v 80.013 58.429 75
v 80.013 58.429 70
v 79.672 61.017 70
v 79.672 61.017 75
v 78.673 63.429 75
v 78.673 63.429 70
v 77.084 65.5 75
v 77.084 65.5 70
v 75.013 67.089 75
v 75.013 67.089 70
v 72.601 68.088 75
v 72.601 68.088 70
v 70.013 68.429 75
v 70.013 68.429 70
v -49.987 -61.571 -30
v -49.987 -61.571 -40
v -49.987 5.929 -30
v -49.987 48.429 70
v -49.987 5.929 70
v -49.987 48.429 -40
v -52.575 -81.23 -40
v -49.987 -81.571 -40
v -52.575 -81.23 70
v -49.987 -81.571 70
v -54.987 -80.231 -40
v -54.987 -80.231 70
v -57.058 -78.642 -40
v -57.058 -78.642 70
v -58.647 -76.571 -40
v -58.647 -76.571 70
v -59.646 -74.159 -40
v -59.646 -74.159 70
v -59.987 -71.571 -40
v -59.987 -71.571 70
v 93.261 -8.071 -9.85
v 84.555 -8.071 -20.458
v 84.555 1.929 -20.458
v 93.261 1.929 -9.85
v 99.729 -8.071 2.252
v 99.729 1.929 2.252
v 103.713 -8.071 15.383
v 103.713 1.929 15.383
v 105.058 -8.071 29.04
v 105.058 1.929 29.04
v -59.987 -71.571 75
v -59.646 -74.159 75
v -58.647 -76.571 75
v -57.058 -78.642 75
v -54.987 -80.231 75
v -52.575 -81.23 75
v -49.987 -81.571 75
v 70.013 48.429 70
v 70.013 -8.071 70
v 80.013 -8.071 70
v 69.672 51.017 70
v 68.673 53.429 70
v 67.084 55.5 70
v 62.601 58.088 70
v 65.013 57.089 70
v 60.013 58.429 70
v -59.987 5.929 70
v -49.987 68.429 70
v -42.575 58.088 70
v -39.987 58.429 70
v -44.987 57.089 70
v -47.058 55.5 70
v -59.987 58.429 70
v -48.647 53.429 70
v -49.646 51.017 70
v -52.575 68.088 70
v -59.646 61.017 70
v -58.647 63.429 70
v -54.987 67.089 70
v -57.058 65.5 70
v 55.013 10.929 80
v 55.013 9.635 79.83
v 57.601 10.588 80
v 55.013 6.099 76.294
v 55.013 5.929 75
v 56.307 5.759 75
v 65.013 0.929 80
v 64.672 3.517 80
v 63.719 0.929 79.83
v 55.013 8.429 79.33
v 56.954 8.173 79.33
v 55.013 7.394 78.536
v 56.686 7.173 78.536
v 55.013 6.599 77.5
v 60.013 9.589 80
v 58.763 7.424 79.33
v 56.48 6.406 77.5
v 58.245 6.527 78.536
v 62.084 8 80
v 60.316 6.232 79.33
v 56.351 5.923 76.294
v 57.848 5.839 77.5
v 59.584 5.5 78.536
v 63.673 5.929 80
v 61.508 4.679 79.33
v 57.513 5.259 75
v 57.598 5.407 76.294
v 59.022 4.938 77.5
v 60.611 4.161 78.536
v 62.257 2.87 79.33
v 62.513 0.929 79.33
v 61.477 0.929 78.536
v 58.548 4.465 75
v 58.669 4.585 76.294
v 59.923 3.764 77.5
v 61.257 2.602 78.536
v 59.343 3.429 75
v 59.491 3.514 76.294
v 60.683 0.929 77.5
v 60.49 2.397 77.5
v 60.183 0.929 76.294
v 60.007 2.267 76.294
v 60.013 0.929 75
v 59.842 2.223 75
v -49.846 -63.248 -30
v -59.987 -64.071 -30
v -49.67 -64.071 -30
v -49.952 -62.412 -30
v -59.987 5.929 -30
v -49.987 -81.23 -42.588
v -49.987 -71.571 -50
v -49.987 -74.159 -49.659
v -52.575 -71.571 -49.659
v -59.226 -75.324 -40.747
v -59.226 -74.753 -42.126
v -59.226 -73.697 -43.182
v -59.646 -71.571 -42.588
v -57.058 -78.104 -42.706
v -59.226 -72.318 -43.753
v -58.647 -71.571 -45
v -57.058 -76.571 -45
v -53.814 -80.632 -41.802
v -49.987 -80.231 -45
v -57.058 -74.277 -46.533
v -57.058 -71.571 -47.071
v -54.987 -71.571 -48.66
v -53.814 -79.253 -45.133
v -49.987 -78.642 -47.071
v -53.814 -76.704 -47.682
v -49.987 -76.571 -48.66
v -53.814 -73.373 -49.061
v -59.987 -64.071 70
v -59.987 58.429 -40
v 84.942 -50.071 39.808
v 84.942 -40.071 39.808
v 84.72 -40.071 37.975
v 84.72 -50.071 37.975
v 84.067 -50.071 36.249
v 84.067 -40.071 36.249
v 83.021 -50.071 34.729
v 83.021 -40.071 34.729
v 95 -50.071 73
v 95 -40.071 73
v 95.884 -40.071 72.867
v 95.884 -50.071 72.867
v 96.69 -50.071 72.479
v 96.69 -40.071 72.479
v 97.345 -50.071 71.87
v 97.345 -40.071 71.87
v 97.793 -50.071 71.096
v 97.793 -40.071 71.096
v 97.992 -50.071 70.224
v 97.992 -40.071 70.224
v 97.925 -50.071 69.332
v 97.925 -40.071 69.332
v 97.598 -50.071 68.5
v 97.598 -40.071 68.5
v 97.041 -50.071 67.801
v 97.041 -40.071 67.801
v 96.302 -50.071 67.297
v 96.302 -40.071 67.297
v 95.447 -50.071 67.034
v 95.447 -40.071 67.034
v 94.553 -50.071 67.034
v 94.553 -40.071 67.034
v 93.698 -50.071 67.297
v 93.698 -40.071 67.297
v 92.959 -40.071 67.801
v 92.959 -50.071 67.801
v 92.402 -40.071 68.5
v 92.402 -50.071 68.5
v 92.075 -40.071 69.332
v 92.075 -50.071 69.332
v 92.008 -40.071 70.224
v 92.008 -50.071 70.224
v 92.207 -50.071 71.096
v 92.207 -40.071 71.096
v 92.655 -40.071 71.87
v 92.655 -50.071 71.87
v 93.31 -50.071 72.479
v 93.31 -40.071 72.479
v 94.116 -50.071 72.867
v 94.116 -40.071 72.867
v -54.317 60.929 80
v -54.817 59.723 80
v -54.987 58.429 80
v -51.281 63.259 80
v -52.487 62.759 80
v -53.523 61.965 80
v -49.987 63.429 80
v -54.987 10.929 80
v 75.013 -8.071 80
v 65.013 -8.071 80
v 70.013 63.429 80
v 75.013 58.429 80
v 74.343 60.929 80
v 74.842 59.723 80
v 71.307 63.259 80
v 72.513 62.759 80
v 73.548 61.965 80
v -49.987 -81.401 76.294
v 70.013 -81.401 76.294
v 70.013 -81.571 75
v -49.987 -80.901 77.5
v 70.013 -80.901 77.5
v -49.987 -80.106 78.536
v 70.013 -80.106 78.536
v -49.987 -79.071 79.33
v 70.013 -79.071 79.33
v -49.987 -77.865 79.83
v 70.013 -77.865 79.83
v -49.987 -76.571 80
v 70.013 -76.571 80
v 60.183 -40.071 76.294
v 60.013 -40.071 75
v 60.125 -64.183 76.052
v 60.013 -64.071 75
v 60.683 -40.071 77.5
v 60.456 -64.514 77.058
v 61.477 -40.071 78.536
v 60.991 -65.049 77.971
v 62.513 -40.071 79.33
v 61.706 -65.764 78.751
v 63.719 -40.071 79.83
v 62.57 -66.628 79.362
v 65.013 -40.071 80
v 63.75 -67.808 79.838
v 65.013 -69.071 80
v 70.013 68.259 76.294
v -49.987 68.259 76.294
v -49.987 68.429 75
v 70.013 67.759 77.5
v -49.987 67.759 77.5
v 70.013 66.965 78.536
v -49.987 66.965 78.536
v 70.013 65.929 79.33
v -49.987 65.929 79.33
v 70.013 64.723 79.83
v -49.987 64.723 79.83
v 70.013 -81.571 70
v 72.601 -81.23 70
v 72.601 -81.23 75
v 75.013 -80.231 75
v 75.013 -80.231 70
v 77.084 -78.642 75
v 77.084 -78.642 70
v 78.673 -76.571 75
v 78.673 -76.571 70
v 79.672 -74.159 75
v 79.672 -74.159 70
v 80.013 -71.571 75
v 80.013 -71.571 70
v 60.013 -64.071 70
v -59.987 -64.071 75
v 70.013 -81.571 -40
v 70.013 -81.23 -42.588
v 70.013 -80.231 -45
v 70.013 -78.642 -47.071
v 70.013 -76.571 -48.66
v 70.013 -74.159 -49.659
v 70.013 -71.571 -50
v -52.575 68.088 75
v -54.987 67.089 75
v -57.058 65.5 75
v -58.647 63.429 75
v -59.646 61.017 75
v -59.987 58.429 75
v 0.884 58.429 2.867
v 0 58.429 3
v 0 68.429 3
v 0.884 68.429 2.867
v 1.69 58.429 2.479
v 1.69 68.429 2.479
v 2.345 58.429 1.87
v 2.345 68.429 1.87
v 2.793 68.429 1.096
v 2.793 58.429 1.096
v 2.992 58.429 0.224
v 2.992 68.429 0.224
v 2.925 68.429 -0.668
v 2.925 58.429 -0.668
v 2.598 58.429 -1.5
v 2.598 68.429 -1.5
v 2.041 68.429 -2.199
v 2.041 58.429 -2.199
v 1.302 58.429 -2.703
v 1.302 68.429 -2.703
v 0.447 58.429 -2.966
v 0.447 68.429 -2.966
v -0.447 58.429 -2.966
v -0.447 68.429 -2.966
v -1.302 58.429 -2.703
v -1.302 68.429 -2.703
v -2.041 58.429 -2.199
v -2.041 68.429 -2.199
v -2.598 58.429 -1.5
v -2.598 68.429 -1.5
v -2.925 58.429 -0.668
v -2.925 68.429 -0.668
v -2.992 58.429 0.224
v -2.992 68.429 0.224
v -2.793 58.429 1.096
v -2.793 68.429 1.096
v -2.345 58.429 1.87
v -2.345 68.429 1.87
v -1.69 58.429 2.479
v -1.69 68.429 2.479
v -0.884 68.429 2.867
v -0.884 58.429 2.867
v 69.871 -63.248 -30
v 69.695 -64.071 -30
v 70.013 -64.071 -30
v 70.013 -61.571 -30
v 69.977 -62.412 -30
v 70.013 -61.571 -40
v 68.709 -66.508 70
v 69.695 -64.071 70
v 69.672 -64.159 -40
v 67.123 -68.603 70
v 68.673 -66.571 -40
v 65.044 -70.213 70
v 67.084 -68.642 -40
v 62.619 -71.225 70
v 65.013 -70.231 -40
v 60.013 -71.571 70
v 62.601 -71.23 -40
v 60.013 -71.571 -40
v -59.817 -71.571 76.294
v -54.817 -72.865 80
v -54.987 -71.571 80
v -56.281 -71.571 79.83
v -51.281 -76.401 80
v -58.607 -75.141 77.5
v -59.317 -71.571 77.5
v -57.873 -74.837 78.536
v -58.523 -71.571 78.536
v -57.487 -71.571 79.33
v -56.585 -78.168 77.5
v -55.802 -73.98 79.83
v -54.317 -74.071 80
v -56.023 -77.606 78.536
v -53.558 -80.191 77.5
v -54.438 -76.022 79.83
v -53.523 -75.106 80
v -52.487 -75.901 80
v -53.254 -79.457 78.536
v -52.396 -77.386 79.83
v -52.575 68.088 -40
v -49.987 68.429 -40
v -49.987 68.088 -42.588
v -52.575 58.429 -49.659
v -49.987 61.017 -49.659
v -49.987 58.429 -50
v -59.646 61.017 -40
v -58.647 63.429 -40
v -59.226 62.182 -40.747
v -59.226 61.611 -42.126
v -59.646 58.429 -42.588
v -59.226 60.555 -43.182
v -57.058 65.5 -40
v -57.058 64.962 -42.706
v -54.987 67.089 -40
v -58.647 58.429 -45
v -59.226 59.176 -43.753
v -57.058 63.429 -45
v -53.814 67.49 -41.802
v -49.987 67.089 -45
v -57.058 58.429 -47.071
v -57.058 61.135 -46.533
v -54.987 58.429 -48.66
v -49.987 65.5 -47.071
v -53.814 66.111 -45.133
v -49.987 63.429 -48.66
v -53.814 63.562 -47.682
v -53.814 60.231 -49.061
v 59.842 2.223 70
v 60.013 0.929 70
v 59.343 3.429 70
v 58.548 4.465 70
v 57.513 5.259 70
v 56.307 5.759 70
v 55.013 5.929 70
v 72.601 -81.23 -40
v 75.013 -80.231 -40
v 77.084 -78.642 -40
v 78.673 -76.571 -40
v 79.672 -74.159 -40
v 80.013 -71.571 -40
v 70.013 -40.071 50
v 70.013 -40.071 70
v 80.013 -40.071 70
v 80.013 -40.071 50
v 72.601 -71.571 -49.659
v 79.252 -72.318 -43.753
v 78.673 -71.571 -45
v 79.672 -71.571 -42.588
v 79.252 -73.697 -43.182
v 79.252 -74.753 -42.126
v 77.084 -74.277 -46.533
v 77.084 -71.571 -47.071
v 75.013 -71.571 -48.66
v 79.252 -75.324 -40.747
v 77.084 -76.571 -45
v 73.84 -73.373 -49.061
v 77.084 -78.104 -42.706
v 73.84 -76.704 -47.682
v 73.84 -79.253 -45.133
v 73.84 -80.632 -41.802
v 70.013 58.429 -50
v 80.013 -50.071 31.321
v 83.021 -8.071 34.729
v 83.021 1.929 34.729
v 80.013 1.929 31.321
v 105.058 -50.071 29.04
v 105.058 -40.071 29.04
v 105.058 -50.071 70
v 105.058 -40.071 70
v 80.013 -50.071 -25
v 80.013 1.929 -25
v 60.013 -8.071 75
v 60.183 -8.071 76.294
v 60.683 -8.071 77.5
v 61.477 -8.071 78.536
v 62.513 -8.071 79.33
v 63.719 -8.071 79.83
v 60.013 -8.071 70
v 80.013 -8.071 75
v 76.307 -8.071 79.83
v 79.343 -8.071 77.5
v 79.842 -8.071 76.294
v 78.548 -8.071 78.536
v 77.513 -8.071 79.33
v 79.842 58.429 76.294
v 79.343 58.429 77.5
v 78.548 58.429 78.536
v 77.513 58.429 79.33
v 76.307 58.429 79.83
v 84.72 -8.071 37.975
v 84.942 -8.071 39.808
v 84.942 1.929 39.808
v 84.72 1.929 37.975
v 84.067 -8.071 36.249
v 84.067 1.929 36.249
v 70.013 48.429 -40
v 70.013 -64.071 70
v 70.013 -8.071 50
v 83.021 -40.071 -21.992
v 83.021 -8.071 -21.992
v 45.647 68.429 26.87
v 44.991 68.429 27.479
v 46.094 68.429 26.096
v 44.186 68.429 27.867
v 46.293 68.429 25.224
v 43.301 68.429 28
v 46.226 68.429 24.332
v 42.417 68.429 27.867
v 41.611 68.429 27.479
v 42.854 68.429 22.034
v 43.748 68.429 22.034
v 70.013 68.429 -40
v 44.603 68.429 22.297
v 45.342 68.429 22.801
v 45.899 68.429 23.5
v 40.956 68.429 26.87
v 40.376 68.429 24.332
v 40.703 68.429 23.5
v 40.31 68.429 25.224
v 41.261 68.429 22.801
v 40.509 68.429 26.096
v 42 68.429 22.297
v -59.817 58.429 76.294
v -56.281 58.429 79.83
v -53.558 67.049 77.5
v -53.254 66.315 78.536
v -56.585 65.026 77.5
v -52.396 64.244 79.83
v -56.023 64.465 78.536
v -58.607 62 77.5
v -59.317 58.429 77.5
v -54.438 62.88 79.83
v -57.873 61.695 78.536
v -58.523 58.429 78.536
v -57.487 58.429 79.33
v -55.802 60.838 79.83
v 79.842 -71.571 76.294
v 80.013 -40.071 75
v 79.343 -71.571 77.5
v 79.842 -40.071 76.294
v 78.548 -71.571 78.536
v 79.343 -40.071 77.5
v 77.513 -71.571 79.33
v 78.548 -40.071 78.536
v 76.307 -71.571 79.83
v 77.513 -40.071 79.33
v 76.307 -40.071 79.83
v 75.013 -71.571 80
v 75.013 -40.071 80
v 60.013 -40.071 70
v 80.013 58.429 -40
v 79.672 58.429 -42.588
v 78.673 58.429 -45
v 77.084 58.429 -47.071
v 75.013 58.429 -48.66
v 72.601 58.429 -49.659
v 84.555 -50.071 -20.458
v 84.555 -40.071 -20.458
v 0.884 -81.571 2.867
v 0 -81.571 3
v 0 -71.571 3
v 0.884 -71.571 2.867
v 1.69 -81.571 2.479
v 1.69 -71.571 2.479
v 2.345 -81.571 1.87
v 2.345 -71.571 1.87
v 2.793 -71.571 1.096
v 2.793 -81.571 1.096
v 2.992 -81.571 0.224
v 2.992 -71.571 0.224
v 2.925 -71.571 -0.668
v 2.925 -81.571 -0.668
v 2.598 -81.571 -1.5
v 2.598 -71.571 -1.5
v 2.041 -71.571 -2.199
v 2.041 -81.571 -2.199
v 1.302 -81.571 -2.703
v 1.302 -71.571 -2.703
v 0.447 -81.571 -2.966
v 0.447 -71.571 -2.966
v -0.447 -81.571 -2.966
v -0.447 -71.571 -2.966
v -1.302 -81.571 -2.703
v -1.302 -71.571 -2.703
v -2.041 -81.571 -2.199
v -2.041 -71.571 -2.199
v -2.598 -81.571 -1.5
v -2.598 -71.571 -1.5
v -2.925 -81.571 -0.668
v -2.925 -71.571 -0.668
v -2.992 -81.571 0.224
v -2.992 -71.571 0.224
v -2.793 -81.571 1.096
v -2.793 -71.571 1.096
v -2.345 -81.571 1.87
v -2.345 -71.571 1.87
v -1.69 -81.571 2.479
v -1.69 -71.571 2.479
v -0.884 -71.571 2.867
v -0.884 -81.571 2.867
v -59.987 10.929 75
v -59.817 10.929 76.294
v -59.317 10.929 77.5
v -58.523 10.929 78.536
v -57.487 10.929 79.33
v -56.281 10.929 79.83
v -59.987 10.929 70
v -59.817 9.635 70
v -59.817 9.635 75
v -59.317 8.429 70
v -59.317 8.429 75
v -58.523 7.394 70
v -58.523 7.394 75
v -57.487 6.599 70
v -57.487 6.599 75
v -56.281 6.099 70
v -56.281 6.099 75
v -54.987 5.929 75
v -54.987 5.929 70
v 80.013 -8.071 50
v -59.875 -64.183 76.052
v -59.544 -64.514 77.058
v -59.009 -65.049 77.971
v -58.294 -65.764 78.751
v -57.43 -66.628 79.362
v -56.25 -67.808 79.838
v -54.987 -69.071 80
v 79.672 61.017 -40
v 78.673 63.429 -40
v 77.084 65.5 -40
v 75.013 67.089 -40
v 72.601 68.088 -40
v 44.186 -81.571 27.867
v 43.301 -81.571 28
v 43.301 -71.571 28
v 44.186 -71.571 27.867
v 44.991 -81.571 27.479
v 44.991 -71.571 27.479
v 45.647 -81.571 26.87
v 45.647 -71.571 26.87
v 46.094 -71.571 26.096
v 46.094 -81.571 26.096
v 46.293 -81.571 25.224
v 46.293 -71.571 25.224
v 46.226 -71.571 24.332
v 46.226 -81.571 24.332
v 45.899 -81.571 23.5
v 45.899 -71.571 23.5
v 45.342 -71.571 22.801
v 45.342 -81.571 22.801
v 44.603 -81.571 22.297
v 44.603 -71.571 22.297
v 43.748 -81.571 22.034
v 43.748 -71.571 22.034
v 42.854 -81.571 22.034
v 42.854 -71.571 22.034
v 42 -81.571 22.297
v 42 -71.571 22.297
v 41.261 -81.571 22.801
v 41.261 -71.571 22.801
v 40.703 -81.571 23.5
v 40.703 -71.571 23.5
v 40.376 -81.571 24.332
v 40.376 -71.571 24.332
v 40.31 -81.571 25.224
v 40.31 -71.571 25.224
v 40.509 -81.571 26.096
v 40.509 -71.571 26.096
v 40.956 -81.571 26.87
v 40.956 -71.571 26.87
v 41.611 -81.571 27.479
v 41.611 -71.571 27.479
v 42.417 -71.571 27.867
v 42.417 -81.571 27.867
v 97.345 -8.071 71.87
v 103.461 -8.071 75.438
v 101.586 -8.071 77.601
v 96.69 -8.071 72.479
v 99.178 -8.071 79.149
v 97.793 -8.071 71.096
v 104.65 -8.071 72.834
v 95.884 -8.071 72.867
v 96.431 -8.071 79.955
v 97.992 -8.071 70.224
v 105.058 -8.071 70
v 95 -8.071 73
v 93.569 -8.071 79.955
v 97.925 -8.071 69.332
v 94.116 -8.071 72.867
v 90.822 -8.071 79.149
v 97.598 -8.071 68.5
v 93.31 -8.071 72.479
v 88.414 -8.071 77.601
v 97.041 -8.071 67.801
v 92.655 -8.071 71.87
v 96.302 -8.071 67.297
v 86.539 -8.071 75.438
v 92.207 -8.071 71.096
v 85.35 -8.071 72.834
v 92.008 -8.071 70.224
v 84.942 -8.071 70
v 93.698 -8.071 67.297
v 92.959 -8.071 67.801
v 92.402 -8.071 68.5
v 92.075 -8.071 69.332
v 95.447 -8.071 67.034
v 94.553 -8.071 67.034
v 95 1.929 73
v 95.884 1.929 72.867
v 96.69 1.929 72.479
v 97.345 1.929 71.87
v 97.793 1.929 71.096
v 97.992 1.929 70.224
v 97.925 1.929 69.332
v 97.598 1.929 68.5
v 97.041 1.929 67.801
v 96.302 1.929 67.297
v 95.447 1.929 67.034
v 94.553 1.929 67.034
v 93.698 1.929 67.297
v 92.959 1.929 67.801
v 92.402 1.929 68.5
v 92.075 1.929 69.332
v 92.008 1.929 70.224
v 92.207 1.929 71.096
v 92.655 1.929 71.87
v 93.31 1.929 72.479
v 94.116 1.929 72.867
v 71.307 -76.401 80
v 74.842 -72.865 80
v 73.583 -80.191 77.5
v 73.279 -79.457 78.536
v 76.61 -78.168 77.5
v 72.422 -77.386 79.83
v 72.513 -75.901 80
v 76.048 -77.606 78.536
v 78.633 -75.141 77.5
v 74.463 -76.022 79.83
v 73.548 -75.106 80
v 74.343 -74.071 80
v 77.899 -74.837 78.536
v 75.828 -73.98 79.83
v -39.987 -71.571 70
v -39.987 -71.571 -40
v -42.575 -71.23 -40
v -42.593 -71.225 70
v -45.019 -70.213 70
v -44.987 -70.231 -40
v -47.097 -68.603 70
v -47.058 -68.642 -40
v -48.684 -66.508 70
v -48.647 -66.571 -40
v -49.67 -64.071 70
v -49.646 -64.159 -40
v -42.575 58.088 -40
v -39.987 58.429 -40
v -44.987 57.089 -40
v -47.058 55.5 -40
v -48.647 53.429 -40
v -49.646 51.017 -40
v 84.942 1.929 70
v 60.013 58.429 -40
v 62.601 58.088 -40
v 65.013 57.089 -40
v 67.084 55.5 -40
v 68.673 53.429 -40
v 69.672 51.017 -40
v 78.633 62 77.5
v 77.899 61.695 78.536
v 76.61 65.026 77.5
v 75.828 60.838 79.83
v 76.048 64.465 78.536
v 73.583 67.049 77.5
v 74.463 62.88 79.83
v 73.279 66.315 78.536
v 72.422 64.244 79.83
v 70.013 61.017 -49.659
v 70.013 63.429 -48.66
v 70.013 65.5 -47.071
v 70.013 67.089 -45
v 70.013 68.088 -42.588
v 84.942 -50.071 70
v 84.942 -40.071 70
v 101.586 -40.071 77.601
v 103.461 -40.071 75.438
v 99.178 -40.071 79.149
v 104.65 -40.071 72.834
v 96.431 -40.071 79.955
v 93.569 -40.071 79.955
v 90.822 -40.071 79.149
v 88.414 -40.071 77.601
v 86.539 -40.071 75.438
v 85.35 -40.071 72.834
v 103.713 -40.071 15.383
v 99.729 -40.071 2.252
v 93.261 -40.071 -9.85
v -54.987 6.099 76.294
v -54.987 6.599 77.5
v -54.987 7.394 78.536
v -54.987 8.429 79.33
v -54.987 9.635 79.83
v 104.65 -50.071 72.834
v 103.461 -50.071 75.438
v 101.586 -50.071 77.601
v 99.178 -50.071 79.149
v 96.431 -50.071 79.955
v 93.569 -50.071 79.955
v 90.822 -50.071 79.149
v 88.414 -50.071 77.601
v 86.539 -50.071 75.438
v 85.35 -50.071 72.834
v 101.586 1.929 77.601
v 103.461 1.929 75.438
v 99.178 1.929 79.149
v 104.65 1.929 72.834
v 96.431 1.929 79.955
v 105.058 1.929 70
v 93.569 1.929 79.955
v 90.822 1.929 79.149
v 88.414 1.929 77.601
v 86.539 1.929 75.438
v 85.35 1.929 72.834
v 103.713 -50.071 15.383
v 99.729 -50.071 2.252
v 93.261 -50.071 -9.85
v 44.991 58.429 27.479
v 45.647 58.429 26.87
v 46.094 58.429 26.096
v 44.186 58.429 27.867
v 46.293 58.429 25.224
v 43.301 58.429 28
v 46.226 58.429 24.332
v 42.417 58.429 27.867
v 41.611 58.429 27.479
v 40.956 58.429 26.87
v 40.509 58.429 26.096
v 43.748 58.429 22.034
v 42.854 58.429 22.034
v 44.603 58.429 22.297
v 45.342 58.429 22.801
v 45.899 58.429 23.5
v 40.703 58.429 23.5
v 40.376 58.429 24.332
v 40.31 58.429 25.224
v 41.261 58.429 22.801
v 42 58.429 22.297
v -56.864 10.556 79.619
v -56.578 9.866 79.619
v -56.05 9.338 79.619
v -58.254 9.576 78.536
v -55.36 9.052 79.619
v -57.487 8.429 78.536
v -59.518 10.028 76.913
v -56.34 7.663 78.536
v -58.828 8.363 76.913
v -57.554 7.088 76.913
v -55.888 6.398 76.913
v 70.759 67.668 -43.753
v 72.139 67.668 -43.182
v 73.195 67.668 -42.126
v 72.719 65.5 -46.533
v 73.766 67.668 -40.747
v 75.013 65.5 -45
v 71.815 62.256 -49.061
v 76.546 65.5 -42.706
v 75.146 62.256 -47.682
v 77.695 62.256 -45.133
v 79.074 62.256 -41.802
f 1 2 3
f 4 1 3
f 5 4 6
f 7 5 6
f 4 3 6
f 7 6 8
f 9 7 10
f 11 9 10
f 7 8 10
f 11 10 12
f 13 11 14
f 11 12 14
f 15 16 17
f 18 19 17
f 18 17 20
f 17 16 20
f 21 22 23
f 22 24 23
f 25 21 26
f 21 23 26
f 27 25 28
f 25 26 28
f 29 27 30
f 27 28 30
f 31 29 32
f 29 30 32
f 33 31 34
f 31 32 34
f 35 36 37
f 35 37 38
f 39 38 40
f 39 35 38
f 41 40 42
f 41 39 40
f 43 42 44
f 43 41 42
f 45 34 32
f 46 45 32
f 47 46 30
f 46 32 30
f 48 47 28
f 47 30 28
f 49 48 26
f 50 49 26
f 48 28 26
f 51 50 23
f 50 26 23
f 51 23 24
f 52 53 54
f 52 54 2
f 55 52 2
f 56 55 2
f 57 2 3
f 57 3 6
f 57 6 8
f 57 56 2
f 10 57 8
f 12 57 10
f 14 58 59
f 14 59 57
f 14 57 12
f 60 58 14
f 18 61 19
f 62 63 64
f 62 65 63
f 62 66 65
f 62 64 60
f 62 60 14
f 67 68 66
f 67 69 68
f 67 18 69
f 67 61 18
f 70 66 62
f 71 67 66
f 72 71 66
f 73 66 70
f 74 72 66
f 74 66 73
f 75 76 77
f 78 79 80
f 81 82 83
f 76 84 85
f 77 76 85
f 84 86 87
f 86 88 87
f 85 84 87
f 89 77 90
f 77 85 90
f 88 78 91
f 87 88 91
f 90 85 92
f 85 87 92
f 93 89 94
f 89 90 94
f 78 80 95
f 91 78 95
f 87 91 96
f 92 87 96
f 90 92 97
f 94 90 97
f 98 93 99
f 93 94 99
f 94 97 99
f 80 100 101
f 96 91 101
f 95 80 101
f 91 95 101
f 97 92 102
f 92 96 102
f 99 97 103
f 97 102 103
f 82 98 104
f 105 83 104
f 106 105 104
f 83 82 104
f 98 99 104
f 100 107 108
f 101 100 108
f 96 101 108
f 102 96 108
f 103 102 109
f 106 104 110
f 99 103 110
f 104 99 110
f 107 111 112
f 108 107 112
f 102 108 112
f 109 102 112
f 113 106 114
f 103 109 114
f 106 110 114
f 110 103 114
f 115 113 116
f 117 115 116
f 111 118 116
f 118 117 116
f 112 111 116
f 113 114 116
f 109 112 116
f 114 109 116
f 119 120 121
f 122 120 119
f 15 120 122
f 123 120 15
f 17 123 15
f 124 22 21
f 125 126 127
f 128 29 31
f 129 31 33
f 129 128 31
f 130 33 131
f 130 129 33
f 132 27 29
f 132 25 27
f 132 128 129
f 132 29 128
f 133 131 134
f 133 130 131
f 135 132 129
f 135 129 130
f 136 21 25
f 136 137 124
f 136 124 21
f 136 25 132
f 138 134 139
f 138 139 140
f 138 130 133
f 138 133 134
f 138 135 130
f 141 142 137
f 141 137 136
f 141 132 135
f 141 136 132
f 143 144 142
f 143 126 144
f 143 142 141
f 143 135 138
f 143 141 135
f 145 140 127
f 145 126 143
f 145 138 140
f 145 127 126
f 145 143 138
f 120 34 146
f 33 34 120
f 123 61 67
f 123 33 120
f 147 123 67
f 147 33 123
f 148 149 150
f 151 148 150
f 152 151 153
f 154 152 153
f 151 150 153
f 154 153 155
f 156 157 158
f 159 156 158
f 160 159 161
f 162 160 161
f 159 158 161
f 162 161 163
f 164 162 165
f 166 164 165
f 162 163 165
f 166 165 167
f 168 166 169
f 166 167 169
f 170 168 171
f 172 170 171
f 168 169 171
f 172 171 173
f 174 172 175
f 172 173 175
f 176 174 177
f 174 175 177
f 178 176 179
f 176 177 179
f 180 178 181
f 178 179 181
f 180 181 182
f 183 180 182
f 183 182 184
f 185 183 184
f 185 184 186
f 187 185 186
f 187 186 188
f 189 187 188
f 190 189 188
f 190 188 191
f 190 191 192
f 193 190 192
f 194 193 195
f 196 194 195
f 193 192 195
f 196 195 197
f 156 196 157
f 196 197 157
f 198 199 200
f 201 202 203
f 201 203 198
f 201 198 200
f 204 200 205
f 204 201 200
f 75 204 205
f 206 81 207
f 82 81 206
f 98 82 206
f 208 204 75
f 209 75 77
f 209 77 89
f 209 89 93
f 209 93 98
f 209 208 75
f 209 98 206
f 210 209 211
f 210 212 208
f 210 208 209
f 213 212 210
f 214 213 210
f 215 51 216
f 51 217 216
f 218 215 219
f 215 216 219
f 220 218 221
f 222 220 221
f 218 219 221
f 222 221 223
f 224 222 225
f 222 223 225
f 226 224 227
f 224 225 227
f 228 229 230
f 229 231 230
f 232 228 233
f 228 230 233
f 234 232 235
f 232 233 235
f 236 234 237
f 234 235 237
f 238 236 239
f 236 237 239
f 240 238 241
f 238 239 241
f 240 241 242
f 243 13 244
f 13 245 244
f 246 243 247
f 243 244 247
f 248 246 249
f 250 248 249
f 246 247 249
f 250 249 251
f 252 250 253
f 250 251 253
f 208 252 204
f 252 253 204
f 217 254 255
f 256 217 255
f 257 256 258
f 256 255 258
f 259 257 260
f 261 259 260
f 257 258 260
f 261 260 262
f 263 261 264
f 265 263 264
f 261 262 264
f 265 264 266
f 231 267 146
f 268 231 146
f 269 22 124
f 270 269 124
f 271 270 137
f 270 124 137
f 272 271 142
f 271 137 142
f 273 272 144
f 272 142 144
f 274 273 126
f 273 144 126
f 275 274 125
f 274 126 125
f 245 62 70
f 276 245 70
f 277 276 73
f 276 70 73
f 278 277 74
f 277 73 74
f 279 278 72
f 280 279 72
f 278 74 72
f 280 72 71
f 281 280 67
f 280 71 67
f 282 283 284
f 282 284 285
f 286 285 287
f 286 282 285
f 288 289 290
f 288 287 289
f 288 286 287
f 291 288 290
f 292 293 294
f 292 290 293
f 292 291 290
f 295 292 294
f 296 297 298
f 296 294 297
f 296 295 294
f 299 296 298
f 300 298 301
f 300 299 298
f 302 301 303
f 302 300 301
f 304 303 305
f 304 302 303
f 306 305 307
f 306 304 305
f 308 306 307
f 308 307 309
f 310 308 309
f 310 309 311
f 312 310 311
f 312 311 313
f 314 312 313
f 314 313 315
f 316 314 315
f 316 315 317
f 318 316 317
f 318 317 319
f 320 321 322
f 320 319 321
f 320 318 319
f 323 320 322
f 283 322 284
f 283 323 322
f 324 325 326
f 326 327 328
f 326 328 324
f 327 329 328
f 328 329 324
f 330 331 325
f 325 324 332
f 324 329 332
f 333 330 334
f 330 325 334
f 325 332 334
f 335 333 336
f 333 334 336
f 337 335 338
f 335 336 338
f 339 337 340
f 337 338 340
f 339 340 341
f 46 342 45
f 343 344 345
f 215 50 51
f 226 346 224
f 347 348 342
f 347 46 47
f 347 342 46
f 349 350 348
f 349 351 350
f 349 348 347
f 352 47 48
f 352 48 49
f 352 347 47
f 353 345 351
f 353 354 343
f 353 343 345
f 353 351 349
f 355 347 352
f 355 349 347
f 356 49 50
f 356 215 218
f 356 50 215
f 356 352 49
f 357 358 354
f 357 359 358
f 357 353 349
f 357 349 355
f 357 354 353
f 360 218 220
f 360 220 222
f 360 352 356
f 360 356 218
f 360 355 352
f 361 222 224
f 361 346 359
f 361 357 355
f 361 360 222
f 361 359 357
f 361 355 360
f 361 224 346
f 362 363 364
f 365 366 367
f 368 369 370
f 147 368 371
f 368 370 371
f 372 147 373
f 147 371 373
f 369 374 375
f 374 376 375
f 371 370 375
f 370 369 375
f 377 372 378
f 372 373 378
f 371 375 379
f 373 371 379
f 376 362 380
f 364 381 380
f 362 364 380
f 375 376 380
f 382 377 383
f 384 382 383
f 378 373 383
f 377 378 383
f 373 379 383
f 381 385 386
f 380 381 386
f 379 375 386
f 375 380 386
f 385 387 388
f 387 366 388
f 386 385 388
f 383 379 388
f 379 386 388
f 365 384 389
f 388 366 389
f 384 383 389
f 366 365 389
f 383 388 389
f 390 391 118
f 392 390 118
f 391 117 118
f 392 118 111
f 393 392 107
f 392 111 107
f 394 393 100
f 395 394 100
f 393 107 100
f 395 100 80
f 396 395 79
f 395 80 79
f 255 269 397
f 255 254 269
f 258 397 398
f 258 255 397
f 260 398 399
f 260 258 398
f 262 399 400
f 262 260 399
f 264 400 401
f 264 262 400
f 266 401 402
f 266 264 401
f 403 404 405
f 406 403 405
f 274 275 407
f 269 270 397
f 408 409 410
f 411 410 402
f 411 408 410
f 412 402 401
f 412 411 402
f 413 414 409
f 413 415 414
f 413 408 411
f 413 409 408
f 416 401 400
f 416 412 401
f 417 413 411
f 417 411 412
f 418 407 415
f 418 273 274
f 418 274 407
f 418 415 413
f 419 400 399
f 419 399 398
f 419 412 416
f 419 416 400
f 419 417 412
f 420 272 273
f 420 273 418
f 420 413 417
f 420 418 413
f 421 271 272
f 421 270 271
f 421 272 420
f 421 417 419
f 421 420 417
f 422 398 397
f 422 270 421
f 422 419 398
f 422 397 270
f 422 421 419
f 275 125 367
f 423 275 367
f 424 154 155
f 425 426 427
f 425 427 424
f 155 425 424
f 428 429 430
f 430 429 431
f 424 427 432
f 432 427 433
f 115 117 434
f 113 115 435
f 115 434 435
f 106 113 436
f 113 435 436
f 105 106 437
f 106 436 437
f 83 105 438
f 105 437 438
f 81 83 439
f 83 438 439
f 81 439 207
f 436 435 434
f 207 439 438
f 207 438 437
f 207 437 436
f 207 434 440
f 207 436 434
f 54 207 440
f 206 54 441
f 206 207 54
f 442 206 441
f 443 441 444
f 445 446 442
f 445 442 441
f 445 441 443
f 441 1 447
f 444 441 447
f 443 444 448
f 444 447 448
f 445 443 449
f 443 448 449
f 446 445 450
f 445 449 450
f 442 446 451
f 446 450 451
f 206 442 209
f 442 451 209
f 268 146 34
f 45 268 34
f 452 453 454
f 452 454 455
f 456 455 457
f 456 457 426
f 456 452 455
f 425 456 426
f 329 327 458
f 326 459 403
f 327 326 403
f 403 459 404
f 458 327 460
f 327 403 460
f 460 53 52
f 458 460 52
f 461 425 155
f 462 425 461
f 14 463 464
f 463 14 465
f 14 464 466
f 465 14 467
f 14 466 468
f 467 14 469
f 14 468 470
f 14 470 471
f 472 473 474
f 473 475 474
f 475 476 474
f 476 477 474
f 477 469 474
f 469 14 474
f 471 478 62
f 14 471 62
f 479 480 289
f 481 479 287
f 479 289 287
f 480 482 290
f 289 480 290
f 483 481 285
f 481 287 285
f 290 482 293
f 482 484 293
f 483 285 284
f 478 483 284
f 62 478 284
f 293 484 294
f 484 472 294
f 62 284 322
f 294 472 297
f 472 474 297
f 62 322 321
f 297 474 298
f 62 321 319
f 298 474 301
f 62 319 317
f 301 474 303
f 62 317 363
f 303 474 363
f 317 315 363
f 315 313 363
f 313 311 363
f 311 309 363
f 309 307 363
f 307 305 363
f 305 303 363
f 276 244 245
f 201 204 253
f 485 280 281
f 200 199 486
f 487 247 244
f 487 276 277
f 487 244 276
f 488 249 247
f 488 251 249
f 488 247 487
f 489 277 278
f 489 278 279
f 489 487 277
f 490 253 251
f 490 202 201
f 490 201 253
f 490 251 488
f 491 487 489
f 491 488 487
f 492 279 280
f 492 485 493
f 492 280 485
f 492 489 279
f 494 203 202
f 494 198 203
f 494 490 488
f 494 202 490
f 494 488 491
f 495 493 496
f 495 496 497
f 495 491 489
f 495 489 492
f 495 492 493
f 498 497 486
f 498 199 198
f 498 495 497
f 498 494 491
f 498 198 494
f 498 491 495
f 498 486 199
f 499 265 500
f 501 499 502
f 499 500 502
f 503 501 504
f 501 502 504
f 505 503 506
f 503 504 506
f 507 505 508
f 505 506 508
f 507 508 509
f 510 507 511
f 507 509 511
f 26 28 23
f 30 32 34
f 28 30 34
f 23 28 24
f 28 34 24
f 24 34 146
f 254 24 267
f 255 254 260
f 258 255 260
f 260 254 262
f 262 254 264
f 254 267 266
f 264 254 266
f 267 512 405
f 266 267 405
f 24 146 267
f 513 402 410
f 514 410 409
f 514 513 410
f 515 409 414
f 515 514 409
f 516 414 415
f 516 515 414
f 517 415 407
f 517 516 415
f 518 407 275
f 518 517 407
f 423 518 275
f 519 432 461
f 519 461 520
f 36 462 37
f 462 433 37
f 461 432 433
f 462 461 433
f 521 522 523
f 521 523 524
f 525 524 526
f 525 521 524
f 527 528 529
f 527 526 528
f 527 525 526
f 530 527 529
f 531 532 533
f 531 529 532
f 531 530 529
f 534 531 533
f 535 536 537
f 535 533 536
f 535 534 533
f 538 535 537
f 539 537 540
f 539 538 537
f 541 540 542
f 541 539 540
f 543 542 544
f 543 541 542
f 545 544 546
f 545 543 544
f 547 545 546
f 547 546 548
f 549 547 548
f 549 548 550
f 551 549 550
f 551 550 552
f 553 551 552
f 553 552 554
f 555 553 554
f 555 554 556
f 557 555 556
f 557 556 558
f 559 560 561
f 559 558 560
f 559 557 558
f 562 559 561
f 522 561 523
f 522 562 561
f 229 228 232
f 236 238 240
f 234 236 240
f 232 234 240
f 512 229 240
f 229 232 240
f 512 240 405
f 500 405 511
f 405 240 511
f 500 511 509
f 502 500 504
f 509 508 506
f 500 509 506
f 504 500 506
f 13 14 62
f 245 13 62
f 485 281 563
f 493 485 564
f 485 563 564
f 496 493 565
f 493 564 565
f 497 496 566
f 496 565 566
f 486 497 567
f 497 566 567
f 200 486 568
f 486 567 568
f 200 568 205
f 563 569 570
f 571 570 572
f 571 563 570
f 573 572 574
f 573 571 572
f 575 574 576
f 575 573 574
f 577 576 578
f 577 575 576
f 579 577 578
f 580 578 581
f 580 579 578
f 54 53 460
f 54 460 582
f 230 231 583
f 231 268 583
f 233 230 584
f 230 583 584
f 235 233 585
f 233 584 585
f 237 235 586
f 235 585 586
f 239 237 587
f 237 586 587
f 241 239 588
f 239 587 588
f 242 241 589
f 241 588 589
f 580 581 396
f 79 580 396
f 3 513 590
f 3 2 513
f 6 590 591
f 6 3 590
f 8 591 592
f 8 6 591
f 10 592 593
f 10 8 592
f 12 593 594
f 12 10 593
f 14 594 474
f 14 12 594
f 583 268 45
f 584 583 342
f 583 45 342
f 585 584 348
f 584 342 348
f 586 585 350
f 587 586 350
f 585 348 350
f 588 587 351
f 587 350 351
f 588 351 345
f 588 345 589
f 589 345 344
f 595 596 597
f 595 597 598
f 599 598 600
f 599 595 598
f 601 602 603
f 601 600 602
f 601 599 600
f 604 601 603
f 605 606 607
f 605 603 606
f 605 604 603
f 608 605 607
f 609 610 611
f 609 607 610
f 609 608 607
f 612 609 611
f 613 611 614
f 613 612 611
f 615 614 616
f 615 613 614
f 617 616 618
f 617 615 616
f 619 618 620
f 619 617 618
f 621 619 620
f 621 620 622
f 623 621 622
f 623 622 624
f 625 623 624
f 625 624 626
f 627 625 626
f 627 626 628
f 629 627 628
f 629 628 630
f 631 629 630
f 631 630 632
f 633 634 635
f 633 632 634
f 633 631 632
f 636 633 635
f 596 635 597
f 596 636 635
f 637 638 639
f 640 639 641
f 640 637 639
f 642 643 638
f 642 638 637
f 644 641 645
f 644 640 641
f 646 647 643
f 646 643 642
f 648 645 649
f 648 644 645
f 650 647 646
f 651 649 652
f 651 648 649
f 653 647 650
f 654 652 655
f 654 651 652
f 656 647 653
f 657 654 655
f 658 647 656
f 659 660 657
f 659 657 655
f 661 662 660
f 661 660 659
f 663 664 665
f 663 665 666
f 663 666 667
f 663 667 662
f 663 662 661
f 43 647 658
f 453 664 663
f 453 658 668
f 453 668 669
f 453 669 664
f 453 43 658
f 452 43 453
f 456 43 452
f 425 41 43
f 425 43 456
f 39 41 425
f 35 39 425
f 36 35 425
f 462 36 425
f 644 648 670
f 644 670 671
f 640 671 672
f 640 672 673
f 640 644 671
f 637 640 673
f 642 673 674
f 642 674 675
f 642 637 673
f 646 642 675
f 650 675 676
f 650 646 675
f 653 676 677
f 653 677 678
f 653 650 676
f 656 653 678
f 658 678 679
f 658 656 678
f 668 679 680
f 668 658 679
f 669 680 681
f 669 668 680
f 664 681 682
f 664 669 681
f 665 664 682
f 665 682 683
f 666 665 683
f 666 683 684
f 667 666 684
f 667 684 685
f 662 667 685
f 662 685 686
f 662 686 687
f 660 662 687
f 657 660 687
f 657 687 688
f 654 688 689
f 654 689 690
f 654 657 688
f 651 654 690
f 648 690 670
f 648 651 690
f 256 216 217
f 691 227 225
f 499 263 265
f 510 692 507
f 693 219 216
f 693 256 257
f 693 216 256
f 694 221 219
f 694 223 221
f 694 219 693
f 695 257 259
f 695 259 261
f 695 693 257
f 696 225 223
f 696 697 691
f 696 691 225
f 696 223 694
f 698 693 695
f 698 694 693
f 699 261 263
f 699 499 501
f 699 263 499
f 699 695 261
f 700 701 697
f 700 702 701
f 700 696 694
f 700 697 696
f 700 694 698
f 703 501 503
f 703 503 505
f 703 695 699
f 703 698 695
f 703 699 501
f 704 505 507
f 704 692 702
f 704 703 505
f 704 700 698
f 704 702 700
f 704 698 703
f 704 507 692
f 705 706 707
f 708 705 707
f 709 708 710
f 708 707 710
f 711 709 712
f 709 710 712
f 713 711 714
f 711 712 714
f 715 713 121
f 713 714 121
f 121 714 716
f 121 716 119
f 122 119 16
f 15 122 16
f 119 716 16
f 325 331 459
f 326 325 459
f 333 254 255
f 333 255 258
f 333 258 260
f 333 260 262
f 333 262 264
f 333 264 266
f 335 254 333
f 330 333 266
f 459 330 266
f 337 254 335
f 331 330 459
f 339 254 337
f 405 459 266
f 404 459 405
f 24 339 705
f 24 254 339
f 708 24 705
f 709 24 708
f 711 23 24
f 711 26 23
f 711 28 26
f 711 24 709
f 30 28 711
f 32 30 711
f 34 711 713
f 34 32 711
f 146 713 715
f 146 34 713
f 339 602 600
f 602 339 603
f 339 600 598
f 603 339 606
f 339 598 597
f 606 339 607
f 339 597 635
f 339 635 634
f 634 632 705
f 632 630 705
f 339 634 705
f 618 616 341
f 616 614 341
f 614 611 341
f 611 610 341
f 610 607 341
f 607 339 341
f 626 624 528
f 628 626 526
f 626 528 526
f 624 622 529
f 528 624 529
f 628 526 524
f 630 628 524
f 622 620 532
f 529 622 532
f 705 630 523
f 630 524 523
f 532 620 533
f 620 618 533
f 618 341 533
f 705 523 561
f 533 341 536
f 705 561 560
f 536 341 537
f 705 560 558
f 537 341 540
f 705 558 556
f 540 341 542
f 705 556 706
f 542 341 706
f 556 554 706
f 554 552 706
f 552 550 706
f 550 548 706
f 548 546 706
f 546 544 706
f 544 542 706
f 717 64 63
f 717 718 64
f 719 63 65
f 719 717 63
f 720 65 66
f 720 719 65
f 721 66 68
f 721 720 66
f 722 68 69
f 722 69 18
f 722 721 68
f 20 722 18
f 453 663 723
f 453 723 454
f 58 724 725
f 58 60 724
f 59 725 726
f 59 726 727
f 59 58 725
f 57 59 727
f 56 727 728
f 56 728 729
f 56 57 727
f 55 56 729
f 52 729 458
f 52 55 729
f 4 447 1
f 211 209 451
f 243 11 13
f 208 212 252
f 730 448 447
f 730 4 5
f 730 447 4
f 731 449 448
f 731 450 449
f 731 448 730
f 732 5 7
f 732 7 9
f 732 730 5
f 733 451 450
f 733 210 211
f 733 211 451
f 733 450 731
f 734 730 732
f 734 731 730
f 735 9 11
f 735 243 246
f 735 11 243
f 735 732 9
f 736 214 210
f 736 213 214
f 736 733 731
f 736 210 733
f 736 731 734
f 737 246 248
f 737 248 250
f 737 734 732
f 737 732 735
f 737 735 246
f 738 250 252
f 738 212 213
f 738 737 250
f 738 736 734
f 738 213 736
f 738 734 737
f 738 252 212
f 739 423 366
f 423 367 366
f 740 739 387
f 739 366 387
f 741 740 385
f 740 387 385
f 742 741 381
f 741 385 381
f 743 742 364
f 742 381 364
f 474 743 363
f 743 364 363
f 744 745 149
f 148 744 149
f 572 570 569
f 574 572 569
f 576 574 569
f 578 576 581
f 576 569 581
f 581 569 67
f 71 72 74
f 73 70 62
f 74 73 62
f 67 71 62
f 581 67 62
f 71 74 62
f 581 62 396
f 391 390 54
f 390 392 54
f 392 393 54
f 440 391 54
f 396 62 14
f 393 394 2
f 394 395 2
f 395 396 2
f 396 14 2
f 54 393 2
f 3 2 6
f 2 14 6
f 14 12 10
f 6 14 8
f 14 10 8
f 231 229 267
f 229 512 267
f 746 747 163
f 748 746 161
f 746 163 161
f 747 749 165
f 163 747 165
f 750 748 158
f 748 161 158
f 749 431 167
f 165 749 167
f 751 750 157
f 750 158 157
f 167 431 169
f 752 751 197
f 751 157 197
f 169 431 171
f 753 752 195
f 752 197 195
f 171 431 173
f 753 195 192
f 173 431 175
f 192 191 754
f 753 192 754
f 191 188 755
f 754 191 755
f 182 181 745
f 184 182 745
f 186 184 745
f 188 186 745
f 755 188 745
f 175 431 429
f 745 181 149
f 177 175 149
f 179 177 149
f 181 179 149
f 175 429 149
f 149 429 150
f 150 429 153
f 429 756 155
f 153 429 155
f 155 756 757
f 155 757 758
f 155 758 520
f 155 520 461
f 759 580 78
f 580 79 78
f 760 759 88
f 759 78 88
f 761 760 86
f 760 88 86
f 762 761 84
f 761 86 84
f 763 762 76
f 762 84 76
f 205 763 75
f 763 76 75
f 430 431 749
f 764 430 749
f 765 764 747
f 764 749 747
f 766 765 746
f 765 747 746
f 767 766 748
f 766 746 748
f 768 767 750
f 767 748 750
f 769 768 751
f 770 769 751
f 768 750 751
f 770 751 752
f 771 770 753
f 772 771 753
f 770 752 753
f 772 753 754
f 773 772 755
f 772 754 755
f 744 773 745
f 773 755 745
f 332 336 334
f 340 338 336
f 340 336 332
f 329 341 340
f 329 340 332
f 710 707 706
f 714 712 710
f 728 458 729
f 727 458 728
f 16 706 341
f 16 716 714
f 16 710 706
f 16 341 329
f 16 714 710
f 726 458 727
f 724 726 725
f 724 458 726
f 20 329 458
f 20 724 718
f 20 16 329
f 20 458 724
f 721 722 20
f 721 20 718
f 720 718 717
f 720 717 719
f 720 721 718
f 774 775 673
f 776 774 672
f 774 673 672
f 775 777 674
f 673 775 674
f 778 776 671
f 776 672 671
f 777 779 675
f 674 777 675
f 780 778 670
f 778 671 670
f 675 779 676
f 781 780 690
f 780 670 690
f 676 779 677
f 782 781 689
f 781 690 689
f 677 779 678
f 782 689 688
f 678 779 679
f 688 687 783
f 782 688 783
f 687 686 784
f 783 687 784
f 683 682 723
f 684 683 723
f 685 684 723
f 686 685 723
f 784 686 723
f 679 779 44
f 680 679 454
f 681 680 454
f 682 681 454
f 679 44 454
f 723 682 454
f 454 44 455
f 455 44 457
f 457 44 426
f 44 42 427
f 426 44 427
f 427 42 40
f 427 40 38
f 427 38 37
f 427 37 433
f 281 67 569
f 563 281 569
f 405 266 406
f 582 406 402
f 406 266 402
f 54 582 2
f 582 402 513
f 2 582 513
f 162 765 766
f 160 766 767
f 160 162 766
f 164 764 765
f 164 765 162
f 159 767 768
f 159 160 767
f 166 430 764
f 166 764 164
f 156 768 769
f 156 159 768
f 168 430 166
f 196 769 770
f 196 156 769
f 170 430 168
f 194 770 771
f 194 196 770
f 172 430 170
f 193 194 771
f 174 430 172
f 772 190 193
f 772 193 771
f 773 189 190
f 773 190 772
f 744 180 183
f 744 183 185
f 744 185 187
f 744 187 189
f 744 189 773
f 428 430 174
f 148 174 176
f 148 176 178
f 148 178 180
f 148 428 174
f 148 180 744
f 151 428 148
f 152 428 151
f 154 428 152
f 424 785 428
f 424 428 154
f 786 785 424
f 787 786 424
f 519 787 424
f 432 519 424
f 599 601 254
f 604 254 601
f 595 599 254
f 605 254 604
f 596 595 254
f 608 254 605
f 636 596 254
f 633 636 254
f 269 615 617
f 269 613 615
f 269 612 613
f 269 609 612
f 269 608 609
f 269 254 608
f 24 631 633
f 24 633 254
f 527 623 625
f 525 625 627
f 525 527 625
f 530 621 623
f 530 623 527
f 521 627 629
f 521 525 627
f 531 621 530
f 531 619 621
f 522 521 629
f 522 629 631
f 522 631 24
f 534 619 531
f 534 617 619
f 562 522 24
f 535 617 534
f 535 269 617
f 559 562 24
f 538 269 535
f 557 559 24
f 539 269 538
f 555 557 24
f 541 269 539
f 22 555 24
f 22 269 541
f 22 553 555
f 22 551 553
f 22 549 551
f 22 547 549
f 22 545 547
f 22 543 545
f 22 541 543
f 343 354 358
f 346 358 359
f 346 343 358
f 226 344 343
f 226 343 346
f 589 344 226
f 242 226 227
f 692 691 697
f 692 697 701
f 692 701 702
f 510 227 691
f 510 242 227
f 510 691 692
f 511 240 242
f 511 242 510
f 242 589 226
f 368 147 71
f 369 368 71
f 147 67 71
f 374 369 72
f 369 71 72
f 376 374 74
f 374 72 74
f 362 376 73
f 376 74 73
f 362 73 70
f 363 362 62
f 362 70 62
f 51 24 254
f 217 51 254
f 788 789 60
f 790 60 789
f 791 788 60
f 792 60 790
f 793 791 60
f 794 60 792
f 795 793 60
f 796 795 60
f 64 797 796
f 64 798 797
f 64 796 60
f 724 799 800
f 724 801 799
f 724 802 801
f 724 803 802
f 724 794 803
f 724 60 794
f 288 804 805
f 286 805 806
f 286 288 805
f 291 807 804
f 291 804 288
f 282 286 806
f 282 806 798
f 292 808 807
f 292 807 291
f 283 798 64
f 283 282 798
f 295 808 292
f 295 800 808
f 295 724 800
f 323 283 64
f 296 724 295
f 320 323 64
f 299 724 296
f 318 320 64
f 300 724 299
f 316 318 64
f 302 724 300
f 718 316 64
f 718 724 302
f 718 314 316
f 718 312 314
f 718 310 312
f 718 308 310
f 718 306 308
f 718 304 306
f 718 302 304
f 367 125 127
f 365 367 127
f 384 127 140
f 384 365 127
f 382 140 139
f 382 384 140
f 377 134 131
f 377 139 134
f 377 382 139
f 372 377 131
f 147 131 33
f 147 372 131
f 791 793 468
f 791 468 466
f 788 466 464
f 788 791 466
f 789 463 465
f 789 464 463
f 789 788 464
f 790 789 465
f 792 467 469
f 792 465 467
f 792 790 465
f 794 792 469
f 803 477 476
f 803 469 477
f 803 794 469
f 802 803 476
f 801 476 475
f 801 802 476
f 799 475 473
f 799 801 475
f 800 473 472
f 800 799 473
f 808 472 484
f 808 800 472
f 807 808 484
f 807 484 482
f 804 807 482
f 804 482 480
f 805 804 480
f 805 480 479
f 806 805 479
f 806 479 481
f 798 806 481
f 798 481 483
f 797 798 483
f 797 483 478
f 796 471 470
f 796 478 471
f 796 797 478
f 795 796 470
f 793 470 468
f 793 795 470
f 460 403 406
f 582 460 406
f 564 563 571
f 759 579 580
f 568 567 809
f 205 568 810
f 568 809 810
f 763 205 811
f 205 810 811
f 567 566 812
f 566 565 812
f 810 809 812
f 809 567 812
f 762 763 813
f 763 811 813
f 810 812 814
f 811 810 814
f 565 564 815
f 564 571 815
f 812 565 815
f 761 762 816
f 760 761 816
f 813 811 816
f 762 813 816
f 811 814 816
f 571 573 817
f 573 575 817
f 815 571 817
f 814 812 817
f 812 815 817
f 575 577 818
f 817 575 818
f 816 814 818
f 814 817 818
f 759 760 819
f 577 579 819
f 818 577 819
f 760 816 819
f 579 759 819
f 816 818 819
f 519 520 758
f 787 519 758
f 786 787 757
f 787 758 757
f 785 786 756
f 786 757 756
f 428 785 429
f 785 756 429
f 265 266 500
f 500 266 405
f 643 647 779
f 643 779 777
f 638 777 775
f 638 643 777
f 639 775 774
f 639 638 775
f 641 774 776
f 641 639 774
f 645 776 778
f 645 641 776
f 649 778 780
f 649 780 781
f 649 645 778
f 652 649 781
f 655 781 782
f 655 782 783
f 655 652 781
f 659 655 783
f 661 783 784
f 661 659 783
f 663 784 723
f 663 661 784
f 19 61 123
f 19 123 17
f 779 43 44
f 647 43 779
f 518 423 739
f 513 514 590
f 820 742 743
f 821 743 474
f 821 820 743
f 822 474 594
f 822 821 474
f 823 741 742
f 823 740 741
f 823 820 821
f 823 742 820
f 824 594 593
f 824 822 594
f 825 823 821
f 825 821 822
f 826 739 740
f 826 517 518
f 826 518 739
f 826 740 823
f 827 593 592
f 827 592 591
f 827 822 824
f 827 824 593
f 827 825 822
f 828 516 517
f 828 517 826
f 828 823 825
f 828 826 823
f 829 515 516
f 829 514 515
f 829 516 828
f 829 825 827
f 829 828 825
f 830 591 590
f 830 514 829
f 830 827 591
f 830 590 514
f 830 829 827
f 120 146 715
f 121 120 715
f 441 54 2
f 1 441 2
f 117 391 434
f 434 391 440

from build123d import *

# Parameters (mm, degrees)
SALIENTE_EXTRUIR1_DEPTH      = 70
SALIENTE_EXTRUIR1_DEPTH_BACK = 50
CROQUIS2_W                   = 150
CROQUIS2_H                   = 140
VACIADO1_T                   = -10
CORTAR_EXTRUIR1_DEPTH        = 134.999546005
CORTAR_EXTRUIR1_DEPTH_BACK   = 134.999546005
CROQUIS4_R                   = 3
REDONDEO9_R                  = 10
CROQUIS6_W                   = 130
CROQUIS6_H                   = 70
CORTAR_EXTRUIR3_DEPTH        = 100
SALIENTE_EXTRUIR2_DEPTH      = 10
REDONDEO17_R                 = 5
SALIENTE_EXTRUIR3_START      = 16
CROQUIS8_R                   = 3
SALIENTE_EXTRUIR3_DEPTH      = 10
SALIENTE_EXTRUIR4_DEPTH      = 25
CROQUIS11_W                  = 23.008413994
CROQUIS11_H                  = 32
CORTAR_EXTRUIR4_DEPTH        = 30


with BuildPart() as part:
    # Croquis2 → Saliente-Extruir1 (new, two sides: drawn at the far end of the back side and taken through both)
    with BuildSketch(Plane(origin=(0, 0, 0), x_dir=(0, 1, 0), z_dir=(0, 0, 1)).offset(-SALIENTE_EXTRUIR1_DEPTH_BACK)):
        with Locations((-6.570945305, -10.012869037)):
            Rectangle(CROQUIS2_W, CROQUIS2_H)
    extrude(amount=SALIENTE_EXTRUIR1_DEPTH + SALIENTE_EXTRUIR1_DEPTH_BACK)

    # Vaciado1
    vaciado1_openings = [part.faces().sort_by_distance(p)[0] for p in [
        (10.012869037, -6.570945305, 70),
    ]]
    offset(amount=VACIADO1_T, openings=vaciado1_openings, kind=Kind.INTERSECTION)

    # Croquis4 → Cortar-Extruir1 (cut, two sides: drawn at the far end of the back side and taken through both)
    with BuildSketch(Plane(origin=(0, 0, 0), x_dir=(-1, 0, 0), z_dir=(0, 1, 0)).offset(-CORTAR_EXTRUIR1_DEPTH_BACK)):
        Circle(CROQUIS4_R)
        with Locations((-43.301270189, 25)):
            Circle(CROQUIS4_R)
    extrude(amount=CORTAR_EXTRUIR1_DEPTH + CORTAR_EXTRUIR1_DEPTH_BACK, mode=Mode.SUBTRACT)

    # Redondeo9
    redondeo9_edges = [part.edges().sort_by_distance(p)[0] for p in [
        (-59.987130963, -6.570945305, -50),
        (-59.987130963, 68.429054695, 10),
        (10.012869037, -81.570945305, -50),
        (-59.987130963, -81.570945305, 10),
        (80.012869037, -6.570945305, -50),
        (80.012869037, -81.570945305, 10),
        (80.012869037, 68.429054695, 10),
        (10.012869037, 68.429054695, -50),
        (70.012869037, 58.429054695, 15),
        (70.012869037, -71.570945305, 15),
        (-49.987130963, 58.429054695, 15),
        (-49.987130963, -71.570945305, 15),
    ]]
    fillet(redondeo9_edges, radius=REDONDEO9_R)

    # Croquis6 → Cortar-Extruir3 (cut)
    with BuildSketch(Plane.XY.offset(70)):
        with Locations((5.012869037, -29.070945305)):
            Rectangle(CROQUIS6_W, CROQUIS6_H)
    extrude(amount=-CORTAR_EXTRUIR3_DEPTH, mode=Mode.SUBTRACT)


with BuildPart() as body_2:
    # Croquis7 → Saliente-Extruir2 (new body)
    with BuildSketch(Plane.XY.offset(70)):
        with BuildLine():
            Line((60.012869037, 5.929054695), (60.012869037, -8.070945305))
            Line((60.012869037, -8.070945305), (60.012869037, -40.070945305))
            Line((60.012869037, -40.070945305), (60.012869037, -64.070945305))
            Line((60.012869037, -64.070945305), (-59.987130963, -64.070945305))
            Line((-59.987130963, -64.070945305), (-59.987130963, -71.570945305))
            ThreePointArc((-59.987130963, -71.570945305), (-57.058198775, -78.642013117), (-49.987130963, -81.570945305))
            Line((-49.987130963, -81.570945305), (70.012869037, -81.570945305))
            ThreePointArc((70.012869037, -81.570945305), (77.083936849, -78.642013117), (80.012869037, -71.570945305))
            Line((80.012869037, -71.570945305), (80.012869037, -40.070945305))
            Line((80.012869037, -40.070945305), (80.012869037, -8.070945305))
            Line((80.012869037, -8.070945305), (80.012869037, 58.429054695))
            ThreePointArc((80.012869037, 58.429054695), (77.083936849, 65.500122507), (70.012869037, 68.429054695))
            Line((70.012869037, 68.429054695), (-49.987130963, 68.429054695))
            ThreePointArc((-49.987130963, 68.429054695), (-57.058198775, 65.500122507), (-59.987130963, 58.429054695))
            Line((-59.987130963, 58.429054695), (-59.987130963, 5.929054695))
            Line((-59.987130963, 5.929054695), (60.012869037, 5.929054695))
        make_face()
    extrude(amount=SALIENTE_EXTRUIR2_DEPTH)

    # Redondeo17
    redondeo17_edges = [body_2.edges().sort_by_distance(p)[0] for p in [
        (-59.987130963, -67.820945305, 80),
        (-57.058198775, -78.642013117, 80),
        (10.012869037, -81.570945305, 80),
        (77.083936849, -78.642013117, 80),
        (80.012869037, -6.570945305, 80),
        (77.083936849, 65.500122507, 80),
        (10.012869037, 68.429054695, 80),
        (-57.058198775, 65.500122507, 80),
        (-59.987130963, 32.179054695, 80),
        (60.012869037, 5.929054695, 75),
        (60.012869037, -29.070945305, 80),
        (0.012869037, -64.070945305, 80),
        (0.012869037, 5.929054695, 80),
        (-59.987130963, 5.929054695, 75),
    ]]
    fillet(redondeo17_edges, radius=REDONDEO17_R)


with BuildPart() as body_3:
    # Croquis8 → Saliente-Extruir3 (new body)
    with BuildSketch(Plane(origin=(0, -24.070945305, 0), x_dir=(1, 0, 0), z_dir=(0, 1, 0)).offset(SALIENTE_EXTRUIR3_START)):
        with BuildLine():
            Line((80.012869037, 25), (84.555109789, 20.457759248))
            ThreePointArc((84.555109789, 20.457759248), (99.729202381, -2.25187517), (105.057635106, -29.039715435))
            Line((105.057635106, -29.039715435), (105.057635106, -70))
            ThreePointArc((105.057635106, -70), (95, -80.057635106), (84.942364894, -70))
            Line((84.942364894, -70), (84.942364894, -39.807745342))
            ThreePointArc((84.942364894, -39.807745342), (84.446046379, -37.092604956), (83.021283031, -34.728631862))
            Line((83.021283031, -34.728631862), (80.012869037, -31.320625087))
            Line((80.012869037, -31.320625087), (80.012869037, 25))
        make_face()
        with Locations((95, -70)):
            Circle(CROQUIS8_R, mode=Mode.SUBTRACT)
    extrude(amount=SALIENTE_EXTRUIR3_DEPTH)


with BuildPart() as body_4:
    # Simetría1: mirrored copy
    add(body_3.part.mirror(Plane.ZX.offset(-24.070945305)))


    add(body_3.part)  # Saliente-Extruir4 merges body 3
    # Croquis10 → Saliente-Extruir4 (add, symmetric)
    with BuildSketch(Plane(origin=(0, -24.070945305, 0), x_dir=(1, 0, 0), z_dir=(0, 1, 0))):
        Polygon((83.021283031, -34.728631862), (83.021283031, 21.991586006), (80.012869037, 25), (80.012869037, -31.320625087), align=None)
    extrude(amount=SALIENTE_EXTRUIR4_DEPTH, both=True)


with BuildPart() as cortar_extruir4_tool:
    # Croquis11 → Cortar-Extruir4 (new body)
    with BuildSketch(Plane.XY.offset(80)):
        with Locations((71.517076034, -24.070945305)):
            Rectangle(CROQUIS11_W, CROQUIS11_H)
    extrude(amount=-CORTAR_EXTRUIR4_DEPTH)


with BuildPart() as part_1:
    add(part.part)

    # Cortar-Extruir4: cut by cortar_extruir4_tool
    add(cortar_extruir4_tool.part, mode=Mode.SUBTRACT)


with BuildPart() as body_2_1:
    add(body_2.part)

    # Cortar-Extruir4: cut by cortar_extruir4_tool
    add(cortar_extruir4_tool.part, mode=Mode.SUBTRACT)


solid = Compound([body_4.part, part_1.part, body_2_1.part])
